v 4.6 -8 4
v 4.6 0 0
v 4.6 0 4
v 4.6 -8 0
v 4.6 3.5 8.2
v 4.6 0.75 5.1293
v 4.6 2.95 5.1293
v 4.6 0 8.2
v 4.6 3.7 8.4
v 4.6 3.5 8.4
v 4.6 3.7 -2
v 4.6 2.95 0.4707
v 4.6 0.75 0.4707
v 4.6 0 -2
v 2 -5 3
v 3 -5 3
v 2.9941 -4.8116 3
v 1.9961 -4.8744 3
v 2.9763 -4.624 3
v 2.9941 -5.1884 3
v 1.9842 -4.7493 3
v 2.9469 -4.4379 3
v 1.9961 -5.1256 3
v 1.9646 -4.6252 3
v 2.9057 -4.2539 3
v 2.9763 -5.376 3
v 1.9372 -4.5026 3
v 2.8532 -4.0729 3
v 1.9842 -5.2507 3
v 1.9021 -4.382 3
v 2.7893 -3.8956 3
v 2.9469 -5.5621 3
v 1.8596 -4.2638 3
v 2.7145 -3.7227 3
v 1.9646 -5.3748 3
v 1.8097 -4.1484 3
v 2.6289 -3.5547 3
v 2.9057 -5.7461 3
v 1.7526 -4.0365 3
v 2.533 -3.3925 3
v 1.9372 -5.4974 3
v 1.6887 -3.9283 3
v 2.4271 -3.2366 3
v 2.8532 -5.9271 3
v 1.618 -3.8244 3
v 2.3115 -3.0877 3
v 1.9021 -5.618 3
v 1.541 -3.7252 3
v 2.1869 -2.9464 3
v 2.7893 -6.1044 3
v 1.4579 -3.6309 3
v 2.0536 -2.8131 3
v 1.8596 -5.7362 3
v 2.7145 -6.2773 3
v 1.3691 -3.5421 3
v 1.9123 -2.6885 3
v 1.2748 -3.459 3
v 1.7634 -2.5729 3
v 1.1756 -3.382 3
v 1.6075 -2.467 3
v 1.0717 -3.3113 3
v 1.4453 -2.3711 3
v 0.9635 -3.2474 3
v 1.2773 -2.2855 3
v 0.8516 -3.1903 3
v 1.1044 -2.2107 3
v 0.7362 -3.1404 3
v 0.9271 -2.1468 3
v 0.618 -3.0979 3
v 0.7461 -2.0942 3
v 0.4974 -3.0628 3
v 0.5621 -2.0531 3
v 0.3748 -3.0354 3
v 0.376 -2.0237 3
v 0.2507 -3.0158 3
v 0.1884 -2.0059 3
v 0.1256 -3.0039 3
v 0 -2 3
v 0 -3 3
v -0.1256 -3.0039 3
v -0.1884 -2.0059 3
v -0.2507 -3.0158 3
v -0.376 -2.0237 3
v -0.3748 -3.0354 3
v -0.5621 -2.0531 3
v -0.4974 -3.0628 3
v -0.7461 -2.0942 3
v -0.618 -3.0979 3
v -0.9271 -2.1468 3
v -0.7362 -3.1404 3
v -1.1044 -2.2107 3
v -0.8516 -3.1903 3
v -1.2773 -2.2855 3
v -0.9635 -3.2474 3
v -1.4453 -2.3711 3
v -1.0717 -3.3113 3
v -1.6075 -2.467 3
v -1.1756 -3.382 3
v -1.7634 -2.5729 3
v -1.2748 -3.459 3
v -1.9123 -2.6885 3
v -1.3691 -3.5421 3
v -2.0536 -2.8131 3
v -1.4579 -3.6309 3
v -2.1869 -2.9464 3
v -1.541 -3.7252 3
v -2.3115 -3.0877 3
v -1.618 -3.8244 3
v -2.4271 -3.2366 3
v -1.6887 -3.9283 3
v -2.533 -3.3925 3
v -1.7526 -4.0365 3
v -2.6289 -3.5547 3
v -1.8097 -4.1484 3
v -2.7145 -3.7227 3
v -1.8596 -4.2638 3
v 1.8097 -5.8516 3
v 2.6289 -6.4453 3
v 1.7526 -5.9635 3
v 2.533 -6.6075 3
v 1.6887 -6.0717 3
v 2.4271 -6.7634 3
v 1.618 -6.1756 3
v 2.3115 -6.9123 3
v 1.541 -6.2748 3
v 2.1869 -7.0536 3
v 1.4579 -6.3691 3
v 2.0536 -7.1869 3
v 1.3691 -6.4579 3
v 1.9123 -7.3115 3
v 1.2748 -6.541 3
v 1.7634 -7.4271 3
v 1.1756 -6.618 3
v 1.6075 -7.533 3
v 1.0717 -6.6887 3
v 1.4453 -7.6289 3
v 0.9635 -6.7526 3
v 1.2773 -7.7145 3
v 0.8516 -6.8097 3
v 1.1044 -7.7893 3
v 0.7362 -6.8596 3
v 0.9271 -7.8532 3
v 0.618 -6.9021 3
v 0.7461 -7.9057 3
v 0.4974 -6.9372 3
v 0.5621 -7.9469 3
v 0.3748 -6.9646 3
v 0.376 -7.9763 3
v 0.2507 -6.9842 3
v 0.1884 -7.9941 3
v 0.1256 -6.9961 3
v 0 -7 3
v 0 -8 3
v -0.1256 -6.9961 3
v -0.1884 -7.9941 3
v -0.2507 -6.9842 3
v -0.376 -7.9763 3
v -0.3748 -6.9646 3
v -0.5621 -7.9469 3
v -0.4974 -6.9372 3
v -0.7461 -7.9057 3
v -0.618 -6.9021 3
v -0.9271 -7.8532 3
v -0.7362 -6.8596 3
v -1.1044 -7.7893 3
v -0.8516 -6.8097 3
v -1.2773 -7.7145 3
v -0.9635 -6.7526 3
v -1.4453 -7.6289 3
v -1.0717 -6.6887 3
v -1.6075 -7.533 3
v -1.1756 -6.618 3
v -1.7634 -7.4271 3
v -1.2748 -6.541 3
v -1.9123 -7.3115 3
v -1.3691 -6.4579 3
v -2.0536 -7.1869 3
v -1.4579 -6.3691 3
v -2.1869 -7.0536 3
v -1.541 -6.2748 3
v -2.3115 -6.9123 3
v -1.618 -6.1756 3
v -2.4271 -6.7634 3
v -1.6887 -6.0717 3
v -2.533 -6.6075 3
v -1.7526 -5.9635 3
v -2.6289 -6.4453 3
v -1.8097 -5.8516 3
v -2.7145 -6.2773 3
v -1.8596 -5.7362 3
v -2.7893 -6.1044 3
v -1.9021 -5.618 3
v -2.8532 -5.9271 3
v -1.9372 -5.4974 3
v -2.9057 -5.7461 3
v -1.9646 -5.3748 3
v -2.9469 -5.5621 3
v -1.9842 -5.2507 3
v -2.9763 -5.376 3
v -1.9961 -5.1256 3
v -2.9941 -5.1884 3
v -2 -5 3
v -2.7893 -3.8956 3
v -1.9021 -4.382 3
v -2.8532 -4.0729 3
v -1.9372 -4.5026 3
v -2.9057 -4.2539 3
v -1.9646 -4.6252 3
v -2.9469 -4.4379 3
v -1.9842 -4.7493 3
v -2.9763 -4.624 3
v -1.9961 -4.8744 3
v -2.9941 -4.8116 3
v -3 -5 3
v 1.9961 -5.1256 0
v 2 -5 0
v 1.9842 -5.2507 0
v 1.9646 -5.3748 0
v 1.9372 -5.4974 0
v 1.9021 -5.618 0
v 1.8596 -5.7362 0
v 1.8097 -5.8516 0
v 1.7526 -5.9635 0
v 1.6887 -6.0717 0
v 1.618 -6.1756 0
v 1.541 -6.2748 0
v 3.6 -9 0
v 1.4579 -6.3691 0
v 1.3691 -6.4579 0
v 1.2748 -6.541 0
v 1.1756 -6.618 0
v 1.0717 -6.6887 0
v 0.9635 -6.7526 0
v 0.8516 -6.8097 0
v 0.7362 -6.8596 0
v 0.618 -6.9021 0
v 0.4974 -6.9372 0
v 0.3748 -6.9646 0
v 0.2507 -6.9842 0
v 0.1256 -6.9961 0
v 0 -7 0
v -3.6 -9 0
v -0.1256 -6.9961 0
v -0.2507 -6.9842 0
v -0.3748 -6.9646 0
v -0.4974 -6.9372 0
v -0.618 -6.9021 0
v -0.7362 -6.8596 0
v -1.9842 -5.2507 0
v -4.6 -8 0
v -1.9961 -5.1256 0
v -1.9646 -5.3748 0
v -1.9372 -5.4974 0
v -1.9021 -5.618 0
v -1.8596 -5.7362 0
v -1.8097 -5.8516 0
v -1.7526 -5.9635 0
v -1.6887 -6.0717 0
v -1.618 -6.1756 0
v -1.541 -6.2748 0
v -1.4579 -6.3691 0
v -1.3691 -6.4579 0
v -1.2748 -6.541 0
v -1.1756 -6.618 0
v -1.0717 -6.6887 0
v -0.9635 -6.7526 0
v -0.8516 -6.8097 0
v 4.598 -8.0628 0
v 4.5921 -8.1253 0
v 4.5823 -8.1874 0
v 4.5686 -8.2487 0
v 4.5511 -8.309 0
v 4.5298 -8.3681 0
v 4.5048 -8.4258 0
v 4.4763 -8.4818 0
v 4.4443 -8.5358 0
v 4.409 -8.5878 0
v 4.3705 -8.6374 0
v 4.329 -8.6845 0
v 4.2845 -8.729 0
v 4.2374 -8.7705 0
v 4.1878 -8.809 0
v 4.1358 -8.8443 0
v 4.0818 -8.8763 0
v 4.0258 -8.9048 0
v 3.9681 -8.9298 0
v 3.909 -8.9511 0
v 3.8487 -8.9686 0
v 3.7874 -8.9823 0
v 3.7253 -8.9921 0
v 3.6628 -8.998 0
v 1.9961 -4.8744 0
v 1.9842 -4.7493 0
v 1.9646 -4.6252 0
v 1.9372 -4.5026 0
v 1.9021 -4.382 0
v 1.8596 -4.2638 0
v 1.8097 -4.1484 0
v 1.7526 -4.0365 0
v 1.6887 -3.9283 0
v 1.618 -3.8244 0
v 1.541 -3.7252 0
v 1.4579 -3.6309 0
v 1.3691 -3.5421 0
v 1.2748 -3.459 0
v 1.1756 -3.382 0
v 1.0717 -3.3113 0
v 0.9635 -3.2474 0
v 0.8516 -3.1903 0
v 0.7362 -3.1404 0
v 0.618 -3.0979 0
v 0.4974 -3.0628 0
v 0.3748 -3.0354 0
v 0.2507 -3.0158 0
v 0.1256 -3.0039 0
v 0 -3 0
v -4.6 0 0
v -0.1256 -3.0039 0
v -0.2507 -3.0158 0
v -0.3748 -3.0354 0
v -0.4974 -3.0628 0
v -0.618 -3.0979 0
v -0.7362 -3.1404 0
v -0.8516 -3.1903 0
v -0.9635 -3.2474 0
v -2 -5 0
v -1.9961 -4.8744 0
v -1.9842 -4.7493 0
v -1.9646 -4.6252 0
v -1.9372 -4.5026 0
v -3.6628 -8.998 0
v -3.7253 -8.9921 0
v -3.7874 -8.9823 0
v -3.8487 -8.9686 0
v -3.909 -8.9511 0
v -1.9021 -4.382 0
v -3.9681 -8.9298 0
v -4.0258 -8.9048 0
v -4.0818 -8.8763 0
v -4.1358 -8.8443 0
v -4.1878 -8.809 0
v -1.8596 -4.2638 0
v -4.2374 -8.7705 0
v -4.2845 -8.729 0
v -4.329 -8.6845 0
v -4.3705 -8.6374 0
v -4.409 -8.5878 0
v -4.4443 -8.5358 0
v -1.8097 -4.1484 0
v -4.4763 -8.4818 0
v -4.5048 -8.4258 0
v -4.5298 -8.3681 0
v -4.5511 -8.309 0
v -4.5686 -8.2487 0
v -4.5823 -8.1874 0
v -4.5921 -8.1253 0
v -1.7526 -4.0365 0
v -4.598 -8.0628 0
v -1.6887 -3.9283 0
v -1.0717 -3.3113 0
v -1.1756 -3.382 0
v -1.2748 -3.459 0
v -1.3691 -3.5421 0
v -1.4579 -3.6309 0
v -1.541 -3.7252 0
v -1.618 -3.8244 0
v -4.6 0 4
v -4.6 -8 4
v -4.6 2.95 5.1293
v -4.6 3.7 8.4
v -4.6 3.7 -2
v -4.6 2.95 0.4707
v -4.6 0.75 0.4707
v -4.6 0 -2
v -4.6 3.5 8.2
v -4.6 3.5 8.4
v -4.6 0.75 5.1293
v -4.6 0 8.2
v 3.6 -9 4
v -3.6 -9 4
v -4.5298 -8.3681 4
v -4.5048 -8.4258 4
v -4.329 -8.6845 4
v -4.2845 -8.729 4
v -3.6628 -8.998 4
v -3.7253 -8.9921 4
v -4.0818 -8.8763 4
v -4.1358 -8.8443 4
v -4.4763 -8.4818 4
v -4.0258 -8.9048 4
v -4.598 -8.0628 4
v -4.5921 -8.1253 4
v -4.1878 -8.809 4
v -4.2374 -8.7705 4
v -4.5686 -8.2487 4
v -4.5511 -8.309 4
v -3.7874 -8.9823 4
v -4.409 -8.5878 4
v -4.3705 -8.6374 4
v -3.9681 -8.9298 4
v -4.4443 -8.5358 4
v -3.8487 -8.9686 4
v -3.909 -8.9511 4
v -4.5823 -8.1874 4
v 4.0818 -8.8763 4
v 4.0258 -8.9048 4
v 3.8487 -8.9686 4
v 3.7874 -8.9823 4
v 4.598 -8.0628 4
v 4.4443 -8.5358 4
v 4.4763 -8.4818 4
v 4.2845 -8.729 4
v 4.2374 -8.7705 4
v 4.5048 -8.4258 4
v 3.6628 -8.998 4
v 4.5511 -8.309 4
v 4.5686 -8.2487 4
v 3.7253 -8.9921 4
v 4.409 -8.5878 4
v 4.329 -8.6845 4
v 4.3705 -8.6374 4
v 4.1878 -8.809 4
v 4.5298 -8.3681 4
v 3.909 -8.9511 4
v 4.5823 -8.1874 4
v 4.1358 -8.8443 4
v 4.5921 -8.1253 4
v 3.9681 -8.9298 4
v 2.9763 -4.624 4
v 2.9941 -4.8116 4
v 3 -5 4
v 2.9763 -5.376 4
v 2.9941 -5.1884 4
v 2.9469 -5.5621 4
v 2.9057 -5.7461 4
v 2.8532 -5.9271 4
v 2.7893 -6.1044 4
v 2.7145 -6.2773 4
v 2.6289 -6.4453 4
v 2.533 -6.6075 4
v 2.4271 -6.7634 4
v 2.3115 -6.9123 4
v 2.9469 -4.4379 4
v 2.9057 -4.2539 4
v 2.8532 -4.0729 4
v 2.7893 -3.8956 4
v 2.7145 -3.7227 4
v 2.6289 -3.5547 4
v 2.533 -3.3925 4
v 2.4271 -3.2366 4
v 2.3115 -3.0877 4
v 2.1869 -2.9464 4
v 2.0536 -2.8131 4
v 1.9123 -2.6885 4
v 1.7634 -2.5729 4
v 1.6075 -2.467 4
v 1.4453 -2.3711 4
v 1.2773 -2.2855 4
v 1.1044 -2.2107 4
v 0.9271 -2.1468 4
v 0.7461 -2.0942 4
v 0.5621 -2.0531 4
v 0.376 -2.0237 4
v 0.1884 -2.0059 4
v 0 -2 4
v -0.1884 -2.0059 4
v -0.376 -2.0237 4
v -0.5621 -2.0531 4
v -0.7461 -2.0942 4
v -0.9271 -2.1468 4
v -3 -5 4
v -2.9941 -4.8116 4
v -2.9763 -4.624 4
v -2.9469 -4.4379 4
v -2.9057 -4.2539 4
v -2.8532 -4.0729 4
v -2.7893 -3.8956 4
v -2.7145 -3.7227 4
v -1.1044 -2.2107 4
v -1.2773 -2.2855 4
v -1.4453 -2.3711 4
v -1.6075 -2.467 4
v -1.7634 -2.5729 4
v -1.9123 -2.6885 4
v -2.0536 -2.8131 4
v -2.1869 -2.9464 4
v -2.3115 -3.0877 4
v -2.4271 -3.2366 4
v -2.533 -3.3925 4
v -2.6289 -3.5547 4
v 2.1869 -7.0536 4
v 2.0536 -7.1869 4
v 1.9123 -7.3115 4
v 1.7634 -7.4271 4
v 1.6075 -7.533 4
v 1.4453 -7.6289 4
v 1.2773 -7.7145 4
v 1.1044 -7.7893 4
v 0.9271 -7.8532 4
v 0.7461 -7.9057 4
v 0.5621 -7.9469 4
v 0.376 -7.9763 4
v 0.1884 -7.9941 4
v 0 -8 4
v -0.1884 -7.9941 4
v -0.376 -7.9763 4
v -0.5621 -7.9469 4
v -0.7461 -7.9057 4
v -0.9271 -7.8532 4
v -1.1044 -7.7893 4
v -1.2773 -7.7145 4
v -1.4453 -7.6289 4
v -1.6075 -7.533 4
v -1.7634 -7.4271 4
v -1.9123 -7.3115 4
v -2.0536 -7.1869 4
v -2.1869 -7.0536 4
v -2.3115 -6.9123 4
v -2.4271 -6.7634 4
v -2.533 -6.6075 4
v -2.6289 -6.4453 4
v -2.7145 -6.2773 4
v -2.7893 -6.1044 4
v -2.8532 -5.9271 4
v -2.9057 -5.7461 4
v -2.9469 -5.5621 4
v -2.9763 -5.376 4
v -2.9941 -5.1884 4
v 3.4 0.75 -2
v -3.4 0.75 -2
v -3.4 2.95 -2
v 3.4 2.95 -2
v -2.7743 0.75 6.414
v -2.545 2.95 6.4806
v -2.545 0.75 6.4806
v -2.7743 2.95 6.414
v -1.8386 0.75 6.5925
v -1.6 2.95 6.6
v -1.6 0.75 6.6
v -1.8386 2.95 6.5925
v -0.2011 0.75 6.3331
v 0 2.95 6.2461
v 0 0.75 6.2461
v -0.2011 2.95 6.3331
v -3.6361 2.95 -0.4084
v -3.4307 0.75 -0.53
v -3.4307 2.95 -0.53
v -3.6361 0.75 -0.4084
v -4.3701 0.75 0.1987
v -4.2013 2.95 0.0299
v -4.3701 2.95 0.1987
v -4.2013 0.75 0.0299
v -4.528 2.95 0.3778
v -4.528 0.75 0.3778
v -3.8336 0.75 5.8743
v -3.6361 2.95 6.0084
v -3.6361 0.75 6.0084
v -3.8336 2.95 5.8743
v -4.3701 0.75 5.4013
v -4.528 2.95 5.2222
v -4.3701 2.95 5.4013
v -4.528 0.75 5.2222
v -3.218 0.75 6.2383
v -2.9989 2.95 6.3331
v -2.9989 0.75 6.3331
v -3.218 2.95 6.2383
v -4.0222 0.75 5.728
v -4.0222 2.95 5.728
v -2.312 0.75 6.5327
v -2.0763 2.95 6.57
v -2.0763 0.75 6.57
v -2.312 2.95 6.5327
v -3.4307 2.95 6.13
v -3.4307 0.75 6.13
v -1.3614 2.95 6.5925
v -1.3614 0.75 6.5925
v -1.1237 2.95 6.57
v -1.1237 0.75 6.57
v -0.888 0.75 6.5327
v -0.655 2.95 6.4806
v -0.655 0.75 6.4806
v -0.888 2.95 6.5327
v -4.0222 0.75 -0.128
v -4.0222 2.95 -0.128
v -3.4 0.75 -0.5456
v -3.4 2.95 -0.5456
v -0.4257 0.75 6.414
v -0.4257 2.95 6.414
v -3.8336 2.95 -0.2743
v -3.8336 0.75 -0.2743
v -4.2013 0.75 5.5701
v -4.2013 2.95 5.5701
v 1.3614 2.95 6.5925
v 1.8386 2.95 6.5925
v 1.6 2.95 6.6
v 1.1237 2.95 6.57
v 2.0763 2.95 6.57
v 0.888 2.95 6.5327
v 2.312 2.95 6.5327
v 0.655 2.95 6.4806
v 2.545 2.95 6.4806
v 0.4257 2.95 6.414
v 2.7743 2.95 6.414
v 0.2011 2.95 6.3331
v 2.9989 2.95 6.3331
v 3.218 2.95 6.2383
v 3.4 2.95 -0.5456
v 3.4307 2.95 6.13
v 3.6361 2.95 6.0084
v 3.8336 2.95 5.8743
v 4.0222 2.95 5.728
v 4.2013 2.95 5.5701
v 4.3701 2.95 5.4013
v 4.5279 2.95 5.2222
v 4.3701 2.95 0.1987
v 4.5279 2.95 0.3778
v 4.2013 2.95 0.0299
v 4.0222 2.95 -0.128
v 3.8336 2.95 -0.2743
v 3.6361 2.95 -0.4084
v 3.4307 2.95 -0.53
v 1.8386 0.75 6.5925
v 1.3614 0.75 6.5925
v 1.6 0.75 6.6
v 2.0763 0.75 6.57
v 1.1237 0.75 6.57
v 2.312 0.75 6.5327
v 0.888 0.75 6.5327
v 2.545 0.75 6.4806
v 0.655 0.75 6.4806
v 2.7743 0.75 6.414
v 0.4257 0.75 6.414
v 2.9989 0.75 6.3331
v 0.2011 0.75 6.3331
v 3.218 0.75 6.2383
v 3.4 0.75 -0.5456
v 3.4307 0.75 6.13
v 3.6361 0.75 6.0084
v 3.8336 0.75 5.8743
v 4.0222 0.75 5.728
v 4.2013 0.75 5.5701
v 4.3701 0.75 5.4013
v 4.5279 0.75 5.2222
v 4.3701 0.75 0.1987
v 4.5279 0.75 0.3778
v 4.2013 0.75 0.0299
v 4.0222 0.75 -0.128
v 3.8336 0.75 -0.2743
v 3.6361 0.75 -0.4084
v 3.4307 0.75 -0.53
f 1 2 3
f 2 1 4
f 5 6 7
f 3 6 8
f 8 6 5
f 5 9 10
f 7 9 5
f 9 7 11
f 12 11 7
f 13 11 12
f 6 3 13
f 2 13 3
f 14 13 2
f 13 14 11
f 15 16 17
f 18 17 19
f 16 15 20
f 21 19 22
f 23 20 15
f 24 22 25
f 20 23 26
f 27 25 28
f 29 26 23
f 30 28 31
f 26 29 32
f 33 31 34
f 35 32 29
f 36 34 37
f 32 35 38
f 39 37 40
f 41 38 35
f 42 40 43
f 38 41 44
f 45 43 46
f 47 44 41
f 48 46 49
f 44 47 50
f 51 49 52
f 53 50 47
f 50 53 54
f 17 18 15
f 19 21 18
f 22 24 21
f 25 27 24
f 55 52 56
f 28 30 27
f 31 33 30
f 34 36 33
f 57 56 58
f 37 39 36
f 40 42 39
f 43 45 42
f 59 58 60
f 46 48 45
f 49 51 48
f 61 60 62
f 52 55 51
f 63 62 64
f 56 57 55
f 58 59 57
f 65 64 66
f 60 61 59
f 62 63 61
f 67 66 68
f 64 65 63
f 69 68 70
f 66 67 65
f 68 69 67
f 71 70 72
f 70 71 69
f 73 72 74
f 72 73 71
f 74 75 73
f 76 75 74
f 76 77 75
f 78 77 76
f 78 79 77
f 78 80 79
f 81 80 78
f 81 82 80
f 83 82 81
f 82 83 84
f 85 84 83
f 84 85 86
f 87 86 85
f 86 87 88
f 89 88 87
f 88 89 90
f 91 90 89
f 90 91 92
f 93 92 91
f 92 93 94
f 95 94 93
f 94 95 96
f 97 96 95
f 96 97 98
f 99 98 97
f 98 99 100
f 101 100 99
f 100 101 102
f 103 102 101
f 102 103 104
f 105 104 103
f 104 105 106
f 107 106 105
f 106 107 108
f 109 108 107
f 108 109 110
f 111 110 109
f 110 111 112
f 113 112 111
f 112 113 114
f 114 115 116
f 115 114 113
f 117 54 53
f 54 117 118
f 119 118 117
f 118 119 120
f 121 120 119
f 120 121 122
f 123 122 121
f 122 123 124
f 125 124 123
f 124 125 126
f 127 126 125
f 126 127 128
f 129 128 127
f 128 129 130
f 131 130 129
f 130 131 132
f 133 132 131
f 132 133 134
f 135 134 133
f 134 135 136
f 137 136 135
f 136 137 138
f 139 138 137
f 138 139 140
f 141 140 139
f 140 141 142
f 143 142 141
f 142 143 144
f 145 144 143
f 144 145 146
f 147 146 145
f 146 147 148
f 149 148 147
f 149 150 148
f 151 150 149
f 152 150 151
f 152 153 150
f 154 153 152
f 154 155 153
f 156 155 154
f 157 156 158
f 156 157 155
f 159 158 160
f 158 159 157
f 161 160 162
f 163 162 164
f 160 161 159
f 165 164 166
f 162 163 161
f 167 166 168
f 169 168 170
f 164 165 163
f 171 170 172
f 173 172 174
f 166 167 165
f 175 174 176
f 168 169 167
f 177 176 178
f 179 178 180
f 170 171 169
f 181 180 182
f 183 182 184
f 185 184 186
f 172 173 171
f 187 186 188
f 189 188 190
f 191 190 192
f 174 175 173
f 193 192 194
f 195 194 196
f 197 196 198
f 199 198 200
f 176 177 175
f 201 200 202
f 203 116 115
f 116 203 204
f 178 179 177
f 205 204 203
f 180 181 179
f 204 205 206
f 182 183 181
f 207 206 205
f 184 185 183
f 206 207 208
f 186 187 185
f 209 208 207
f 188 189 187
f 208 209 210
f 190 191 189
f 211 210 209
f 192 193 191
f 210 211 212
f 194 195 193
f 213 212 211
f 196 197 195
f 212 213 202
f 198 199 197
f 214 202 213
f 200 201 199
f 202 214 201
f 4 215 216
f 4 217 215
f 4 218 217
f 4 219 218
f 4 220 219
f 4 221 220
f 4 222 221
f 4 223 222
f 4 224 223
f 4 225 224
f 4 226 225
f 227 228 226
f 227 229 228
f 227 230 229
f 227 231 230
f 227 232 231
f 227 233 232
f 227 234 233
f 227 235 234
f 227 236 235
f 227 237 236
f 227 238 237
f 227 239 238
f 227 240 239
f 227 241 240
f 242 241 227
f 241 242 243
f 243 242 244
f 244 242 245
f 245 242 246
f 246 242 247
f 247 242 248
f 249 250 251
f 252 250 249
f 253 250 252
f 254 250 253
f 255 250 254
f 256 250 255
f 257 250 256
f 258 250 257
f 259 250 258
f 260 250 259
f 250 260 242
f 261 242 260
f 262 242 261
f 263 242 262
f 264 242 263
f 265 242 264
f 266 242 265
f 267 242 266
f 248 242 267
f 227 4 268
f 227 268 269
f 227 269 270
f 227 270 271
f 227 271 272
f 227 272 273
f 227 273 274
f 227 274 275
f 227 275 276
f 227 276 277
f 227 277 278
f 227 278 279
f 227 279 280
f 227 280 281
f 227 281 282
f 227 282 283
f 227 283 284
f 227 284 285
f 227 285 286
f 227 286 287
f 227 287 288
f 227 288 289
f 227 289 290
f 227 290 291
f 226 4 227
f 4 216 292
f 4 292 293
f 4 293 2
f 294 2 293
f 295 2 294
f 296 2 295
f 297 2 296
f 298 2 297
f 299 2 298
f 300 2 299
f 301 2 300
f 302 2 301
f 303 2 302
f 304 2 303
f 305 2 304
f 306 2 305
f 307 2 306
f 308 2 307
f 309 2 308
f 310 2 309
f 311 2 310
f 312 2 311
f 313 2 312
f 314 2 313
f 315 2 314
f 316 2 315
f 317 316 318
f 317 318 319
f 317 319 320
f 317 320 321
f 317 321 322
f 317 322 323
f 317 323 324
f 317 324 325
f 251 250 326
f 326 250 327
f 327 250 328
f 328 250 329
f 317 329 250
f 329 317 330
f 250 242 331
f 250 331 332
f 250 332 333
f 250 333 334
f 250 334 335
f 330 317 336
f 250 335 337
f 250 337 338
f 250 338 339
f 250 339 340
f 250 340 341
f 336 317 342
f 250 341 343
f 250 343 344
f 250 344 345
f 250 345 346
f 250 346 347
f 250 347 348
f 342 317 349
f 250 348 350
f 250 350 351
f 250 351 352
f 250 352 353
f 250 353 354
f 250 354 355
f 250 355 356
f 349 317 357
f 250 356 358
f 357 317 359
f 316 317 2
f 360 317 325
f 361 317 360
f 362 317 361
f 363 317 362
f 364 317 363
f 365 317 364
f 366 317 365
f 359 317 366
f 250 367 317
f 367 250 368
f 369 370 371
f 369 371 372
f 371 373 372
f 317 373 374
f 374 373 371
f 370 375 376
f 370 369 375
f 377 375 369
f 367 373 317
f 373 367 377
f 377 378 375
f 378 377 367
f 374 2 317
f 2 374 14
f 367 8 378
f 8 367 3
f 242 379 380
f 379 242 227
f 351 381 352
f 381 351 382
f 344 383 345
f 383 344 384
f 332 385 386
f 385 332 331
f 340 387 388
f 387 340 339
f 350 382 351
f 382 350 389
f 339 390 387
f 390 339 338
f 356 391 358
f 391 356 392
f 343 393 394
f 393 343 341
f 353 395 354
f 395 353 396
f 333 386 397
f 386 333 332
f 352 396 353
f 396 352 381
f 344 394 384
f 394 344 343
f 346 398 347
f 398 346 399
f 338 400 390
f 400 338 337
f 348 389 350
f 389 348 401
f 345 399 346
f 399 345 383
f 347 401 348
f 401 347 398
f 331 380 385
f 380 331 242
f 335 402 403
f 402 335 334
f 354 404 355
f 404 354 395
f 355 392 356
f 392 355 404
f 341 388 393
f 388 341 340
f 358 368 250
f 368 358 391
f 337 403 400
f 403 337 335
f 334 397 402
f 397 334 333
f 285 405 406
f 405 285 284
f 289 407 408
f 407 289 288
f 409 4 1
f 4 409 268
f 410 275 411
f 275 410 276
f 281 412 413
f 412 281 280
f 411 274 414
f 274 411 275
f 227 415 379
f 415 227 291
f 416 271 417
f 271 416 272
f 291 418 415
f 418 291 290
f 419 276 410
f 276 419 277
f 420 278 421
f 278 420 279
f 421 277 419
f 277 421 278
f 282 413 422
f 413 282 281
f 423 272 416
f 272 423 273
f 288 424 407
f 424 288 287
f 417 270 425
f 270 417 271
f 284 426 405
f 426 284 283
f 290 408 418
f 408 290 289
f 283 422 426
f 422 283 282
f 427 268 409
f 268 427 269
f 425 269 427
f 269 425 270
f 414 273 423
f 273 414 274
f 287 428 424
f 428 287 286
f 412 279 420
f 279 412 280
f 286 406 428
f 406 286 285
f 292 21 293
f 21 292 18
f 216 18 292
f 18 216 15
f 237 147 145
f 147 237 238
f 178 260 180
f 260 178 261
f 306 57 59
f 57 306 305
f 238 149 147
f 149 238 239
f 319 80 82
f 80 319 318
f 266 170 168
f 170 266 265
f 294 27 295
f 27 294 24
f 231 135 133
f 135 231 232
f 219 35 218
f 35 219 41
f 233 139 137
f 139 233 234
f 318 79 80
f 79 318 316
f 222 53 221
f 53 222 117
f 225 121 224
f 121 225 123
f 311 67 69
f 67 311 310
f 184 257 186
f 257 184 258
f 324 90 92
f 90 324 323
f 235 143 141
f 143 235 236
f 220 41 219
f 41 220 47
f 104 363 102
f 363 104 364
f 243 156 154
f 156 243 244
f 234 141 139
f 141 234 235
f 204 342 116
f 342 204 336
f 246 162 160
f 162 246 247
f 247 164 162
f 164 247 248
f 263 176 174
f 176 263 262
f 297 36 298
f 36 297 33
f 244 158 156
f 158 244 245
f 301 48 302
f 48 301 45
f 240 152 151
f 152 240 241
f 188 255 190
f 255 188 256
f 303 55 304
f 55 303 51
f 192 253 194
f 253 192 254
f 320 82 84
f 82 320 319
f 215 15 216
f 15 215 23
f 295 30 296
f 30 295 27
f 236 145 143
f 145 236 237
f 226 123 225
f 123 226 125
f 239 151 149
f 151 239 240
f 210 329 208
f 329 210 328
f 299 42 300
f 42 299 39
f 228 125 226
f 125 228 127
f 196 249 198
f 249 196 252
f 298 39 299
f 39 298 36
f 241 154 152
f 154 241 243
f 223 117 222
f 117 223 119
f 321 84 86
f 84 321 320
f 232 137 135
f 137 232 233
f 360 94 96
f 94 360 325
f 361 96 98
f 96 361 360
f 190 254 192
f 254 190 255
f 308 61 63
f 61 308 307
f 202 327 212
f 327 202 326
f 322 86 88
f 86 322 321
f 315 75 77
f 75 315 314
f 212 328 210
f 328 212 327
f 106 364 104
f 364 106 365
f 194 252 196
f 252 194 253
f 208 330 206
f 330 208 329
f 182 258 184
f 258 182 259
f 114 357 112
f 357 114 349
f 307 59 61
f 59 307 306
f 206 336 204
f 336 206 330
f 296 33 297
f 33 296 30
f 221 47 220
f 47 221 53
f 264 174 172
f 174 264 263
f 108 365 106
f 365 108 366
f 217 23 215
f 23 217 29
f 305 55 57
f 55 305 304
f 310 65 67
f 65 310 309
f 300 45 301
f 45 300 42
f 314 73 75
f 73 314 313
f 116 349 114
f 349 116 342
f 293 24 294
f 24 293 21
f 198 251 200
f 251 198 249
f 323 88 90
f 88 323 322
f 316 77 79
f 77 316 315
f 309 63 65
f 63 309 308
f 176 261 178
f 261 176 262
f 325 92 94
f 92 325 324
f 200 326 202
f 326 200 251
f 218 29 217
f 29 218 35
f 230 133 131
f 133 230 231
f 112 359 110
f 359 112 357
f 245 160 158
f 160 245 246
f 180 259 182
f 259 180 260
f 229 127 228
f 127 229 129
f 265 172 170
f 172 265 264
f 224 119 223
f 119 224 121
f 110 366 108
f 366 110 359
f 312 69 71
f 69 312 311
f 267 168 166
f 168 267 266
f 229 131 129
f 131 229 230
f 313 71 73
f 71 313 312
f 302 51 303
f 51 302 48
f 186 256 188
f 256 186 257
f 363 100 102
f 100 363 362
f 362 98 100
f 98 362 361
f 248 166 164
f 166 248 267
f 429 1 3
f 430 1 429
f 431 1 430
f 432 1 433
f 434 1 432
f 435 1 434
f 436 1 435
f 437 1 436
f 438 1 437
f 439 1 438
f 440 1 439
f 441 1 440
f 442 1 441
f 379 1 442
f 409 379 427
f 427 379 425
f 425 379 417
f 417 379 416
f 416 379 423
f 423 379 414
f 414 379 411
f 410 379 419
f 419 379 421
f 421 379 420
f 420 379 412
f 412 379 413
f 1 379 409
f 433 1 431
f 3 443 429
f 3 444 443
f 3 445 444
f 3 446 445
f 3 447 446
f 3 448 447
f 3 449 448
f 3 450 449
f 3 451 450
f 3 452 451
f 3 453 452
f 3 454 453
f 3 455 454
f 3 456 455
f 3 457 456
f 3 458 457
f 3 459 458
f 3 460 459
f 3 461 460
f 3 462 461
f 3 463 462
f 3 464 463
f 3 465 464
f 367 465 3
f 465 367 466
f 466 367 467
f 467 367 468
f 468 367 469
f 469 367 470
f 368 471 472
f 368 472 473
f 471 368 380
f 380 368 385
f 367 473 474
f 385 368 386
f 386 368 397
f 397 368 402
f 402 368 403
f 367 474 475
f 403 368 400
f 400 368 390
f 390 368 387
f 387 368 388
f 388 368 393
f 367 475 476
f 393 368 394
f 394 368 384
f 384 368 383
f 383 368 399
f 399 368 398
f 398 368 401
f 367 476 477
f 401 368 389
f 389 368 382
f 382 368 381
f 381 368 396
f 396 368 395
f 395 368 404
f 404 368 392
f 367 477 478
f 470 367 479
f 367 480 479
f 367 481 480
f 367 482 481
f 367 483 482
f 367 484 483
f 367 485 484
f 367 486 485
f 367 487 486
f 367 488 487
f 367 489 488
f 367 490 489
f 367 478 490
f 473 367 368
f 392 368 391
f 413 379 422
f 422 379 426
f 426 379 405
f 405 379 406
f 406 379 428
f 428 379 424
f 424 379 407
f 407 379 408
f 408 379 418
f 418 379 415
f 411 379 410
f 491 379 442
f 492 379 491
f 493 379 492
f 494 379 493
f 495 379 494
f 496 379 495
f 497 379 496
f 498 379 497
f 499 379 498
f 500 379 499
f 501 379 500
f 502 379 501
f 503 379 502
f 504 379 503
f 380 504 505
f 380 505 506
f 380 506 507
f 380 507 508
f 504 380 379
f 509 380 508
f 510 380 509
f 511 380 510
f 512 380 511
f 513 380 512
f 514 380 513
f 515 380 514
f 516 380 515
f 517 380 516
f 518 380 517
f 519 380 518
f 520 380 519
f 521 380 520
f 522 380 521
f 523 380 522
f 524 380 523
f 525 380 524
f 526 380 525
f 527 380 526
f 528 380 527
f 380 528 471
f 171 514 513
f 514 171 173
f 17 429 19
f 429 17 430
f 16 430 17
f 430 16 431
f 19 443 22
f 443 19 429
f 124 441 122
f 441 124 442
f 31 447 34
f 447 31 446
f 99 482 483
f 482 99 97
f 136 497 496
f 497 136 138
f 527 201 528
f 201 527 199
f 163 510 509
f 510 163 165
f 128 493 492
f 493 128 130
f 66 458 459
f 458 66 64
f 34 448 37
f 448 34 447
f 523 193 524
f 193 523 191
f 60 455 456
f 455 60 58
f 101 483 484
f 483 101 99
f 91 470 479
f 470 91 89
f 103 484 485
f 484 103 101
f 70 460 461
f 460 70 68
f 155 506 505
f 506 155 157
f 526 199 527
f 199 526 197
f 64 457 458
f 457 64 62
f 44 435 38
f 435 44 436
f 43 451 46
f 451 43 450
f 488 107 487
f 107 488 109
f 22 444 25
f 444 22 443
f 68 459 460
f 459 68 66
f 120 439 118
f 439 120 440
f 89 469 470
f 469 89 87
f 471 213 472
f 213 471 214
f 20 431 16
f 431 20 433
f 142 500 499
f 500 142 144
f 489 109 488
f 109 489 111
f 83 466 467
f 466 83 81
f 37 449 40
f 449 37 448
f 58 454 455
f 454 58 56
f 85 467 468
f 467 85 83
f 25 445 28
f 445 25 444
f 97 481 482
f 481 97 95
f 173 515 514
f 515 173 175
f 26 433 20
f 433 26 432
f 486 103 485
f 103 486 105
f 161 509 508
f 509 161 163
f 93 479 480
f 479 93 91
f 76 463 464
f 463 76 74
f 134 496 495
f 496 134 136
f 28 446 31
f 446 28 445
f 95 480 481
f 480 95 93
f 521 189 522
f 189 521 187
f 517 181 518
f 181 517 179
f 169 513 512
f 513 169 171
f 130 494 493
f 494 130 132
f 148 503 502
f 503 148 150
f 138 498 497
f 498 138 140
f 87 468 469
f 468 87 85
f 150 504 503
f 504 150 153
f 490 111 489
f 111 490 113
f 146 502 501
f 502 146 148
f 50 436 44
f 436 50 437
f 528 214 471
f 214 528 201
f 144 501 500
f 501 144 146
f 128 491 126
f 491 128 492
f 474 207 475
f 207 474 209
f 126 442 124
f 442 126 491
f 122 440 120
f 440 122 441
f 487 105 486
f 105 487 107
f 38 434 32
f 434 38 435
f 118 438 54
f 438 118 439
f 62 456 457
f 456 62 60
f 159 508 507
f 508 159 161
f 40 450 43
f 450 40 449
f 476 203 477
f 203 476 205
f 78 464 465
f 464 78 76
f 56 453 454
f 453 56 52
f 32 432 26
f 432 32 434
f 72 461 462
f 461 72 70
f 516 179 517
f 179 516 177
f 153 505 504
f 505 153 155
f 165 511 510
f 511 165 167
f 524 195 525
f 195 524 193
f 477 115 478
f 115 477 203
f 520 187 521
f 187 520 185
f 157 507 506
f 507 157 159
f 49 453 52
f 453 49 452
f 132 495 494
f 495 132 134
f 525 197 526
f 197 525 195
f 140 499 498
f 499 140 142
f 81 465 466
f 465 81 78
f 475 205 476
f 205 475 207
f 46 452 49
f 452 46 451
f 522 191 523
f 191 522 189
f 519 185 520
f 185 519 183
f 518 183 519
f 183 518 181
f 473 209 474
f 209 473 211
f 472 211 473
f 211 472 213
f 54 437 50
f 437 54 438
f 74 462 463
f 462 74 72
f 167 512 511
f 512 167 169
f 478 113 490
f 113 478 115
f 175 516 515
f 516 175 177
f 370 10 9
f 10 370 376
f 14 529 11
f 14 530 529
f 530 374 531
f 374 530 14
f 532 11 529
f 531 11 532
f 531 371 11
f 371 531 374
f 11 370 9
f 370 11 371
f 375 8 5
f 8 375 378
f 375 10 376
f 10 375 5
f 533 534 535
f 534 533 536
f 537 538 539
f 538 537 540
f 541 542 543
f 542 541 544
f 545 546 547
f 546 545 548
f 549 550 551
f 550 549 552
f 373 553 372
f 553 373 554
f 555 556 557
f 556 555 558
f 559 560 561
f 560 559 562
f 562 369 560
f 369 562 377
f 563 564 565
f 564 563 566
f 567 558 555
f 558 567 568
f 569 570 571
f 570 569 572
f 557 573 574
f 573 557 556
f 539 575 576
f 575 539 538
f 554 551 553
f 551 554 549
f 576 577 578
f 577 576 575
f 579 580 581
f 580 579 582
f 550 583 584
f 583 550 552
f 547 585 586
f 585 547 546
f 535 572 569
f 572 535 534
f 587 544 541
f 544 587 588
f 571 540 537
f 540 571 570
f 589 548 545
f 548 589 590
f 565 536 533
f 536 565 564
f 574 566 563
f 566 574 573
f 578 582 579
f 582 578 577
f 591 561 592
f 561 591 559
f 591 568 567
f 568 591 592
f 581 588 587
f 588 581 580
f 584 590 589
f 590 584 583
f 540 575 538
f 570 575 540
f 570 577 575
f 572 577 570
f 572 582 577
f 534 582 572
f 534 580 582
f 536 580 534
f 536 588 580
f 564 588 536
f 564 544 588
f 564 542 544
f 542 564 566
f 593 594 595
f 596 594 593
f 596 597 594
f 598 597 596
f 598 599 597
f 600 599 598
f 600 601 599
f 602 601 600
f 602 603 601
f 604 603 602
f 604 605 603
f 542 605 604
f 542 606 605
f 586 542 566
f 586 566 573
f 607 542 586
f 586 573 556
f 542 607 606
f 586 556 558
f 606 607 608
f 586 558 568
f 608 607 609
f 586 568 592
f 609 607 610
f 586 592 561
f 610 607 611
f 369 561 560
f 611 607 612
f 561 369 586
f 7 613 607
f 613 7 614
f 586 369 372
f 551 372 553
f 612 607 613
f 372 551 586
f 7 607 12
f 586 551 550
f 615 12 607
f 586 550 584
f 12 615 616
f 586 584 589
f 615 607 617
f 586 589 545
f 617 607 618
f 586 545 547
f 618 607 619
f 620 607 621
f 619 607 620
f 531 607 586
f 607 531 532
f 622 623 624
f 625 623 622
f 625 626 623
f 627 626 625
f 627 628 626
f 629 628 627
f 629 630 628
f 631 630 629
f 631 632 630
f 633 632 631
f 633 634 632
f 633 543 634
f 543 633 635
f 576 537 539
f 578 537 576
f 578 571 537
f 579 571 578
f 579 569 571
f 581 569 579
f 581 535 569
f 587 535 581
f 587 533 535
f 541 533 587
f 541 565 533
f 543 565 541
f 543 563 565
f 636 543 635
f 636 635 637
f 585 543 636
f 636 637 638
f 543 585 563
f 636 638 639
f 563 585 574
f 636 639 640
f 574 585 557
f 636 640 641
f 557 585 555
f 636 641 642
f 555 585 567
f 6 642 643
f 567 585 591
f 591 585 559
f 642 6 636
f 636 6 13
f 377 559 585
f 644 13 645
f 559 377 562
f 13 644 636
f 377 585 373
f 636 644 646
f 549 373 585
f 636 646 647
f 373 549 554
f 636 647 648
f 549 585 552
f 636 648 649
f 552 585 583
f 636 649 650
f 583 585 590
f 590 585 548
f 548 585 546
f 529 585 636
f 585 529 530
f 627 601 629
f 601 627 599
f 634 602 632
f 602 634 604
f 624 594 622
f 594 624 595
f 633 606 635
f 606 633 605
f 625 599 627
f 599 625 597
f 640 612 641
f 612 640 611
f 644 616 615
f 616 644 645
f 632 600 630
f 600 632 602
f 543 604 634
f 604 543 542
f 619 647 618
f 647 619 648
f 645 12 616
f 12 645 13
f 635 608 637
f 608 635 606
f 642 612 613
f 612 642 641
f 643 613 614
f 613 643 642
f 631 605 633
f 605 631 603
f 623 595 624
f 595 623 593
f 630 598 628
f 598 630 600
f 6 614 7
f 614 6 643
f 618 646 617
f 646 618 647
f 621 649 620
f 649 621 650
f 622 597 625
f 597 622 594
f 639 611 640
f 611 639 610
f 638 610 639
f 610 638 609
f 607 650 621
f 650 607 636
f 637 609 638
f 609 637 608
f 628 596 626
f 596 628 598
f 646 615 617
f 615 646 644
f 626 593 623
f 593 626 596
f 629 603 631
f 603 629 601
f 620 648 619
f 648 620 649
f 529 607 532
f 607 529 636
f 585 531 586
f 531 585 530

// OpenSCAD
// file: openscad_modules/modules/RoundedRectangle.scad
// parameters
X = 50;
Y = 30;
THICKNESS = 2;
R = 2;
RESOLUTION = 50;

module RoundedRectangle(x, y, thickness, r, $fn=0) {

    translate([0, r, 0])
        cube([x, y-2*r, thickness]);
    translate([r, 0, 0])
        cube([x-2*r, y, thickness]);

    translate([r, r, 0])
        cylinder(r=r, h=thickness, $fn=$fn);
    translate([x-r, r, 0])
        cylinder(r=r, h=thickness, $fn=$fn);
    translate([r, y-r, 0])
        cylinder(r=r, h=thickness, $fn=$fn);
    translate([x-r, y-r, 0])
        cylinder(r=r, h=thickness, $fn=$fn);

}

// main
RoundedRectangle(x=X, y=Y, thickness=THICKNESS, r=R, $fn=RESOLUTION);
// main file
use <openscad_modules/modules/RoundedRectangle.scad>

// 左は両方共内側
r_screw_inner = 2.0;
r_screw_outer = 3.0;
y_screw = -5.0;
d_base = 3.0;
x_base = 9.2;
y_base = 9;
h_foot = 8.4;
d_magnet = 2.2;
r_magnet = 3.8;
x_joint = x_base;
y_joint = d_magnet + 1.5;
RESOLUTION = 100;

PARTS_ID = 1;


module MD650L_base() {
    difference() {
        union() {
            translate([-x_base/2, -y_base, 0]) {
                RoundedRectangle(x=x_base, y=y_base, thickness=d_base, r=1, $fn=RESOLUTION);
                translate([0, y_base/2, 0])
                    cube([x_base, y_base/2, d_base]);
            }
        }
        
        translate([0, y_screw, 0])
            cylinder(r=r_screw_inner, h=d_base, $fn=RESOLUTION);
    }
    
    translate([0, 0, d_base])
        difference() {
            union() {
                translate([-x_base/2, -y_base, 0]) {
                    RoundedRectangle(x=x_base, y=y_base, thickness=1, r=1, $fn=RESOLUTION);
                    translate([0, y_base/2, 0])
                        cube([x_base, y_base/2, 1]);
                }
            }
            
            translate([0, y_screw, 0])
                cylinder(r=r_screw_outer, h=h_foot, $fn=RESOLUTION);
        }
}

MD650L_base();
if (PARTS_ID == 1) {
    translate([-x_joint/2, 0, -2]) {
        difference() {
            cube([x_joint, y_joint, h_foot+2]);
            translate([0, 0, h_foot+2-0.2])
                cube([x_base, 3.5, h_foot]);
            
            translate([x_joint/2-1.6, d_magnet+0.75, 1+r_magnet])
                rotate([90, 0, 0])
                    cylinder(r=r_magnet, h=d_magnet, $fn=RESOLUTION);
            translate([x_joint/2+1.6, d_magnet+0.75, 1+r_magnet])
                rotate([90, 0, 0])
                    cylinder(r=r_magnet, h=d_magnet, $fn=RESOLUTION);
            
            translate([x_joint/2, d_magnet+0.75, 1+r_magnet])
                rotate([90, 0, 0])
                    hull() {
                        cylinder(r=r_magnet-0.4, h=d_magnet, $fn=RESOLUTION);
                        translate([0, -10, 0])
                            cylinder(r=r_magnet-0.4, h=d_magnet, $fn=RESOLUTION);
                    }
        }
    }
}
